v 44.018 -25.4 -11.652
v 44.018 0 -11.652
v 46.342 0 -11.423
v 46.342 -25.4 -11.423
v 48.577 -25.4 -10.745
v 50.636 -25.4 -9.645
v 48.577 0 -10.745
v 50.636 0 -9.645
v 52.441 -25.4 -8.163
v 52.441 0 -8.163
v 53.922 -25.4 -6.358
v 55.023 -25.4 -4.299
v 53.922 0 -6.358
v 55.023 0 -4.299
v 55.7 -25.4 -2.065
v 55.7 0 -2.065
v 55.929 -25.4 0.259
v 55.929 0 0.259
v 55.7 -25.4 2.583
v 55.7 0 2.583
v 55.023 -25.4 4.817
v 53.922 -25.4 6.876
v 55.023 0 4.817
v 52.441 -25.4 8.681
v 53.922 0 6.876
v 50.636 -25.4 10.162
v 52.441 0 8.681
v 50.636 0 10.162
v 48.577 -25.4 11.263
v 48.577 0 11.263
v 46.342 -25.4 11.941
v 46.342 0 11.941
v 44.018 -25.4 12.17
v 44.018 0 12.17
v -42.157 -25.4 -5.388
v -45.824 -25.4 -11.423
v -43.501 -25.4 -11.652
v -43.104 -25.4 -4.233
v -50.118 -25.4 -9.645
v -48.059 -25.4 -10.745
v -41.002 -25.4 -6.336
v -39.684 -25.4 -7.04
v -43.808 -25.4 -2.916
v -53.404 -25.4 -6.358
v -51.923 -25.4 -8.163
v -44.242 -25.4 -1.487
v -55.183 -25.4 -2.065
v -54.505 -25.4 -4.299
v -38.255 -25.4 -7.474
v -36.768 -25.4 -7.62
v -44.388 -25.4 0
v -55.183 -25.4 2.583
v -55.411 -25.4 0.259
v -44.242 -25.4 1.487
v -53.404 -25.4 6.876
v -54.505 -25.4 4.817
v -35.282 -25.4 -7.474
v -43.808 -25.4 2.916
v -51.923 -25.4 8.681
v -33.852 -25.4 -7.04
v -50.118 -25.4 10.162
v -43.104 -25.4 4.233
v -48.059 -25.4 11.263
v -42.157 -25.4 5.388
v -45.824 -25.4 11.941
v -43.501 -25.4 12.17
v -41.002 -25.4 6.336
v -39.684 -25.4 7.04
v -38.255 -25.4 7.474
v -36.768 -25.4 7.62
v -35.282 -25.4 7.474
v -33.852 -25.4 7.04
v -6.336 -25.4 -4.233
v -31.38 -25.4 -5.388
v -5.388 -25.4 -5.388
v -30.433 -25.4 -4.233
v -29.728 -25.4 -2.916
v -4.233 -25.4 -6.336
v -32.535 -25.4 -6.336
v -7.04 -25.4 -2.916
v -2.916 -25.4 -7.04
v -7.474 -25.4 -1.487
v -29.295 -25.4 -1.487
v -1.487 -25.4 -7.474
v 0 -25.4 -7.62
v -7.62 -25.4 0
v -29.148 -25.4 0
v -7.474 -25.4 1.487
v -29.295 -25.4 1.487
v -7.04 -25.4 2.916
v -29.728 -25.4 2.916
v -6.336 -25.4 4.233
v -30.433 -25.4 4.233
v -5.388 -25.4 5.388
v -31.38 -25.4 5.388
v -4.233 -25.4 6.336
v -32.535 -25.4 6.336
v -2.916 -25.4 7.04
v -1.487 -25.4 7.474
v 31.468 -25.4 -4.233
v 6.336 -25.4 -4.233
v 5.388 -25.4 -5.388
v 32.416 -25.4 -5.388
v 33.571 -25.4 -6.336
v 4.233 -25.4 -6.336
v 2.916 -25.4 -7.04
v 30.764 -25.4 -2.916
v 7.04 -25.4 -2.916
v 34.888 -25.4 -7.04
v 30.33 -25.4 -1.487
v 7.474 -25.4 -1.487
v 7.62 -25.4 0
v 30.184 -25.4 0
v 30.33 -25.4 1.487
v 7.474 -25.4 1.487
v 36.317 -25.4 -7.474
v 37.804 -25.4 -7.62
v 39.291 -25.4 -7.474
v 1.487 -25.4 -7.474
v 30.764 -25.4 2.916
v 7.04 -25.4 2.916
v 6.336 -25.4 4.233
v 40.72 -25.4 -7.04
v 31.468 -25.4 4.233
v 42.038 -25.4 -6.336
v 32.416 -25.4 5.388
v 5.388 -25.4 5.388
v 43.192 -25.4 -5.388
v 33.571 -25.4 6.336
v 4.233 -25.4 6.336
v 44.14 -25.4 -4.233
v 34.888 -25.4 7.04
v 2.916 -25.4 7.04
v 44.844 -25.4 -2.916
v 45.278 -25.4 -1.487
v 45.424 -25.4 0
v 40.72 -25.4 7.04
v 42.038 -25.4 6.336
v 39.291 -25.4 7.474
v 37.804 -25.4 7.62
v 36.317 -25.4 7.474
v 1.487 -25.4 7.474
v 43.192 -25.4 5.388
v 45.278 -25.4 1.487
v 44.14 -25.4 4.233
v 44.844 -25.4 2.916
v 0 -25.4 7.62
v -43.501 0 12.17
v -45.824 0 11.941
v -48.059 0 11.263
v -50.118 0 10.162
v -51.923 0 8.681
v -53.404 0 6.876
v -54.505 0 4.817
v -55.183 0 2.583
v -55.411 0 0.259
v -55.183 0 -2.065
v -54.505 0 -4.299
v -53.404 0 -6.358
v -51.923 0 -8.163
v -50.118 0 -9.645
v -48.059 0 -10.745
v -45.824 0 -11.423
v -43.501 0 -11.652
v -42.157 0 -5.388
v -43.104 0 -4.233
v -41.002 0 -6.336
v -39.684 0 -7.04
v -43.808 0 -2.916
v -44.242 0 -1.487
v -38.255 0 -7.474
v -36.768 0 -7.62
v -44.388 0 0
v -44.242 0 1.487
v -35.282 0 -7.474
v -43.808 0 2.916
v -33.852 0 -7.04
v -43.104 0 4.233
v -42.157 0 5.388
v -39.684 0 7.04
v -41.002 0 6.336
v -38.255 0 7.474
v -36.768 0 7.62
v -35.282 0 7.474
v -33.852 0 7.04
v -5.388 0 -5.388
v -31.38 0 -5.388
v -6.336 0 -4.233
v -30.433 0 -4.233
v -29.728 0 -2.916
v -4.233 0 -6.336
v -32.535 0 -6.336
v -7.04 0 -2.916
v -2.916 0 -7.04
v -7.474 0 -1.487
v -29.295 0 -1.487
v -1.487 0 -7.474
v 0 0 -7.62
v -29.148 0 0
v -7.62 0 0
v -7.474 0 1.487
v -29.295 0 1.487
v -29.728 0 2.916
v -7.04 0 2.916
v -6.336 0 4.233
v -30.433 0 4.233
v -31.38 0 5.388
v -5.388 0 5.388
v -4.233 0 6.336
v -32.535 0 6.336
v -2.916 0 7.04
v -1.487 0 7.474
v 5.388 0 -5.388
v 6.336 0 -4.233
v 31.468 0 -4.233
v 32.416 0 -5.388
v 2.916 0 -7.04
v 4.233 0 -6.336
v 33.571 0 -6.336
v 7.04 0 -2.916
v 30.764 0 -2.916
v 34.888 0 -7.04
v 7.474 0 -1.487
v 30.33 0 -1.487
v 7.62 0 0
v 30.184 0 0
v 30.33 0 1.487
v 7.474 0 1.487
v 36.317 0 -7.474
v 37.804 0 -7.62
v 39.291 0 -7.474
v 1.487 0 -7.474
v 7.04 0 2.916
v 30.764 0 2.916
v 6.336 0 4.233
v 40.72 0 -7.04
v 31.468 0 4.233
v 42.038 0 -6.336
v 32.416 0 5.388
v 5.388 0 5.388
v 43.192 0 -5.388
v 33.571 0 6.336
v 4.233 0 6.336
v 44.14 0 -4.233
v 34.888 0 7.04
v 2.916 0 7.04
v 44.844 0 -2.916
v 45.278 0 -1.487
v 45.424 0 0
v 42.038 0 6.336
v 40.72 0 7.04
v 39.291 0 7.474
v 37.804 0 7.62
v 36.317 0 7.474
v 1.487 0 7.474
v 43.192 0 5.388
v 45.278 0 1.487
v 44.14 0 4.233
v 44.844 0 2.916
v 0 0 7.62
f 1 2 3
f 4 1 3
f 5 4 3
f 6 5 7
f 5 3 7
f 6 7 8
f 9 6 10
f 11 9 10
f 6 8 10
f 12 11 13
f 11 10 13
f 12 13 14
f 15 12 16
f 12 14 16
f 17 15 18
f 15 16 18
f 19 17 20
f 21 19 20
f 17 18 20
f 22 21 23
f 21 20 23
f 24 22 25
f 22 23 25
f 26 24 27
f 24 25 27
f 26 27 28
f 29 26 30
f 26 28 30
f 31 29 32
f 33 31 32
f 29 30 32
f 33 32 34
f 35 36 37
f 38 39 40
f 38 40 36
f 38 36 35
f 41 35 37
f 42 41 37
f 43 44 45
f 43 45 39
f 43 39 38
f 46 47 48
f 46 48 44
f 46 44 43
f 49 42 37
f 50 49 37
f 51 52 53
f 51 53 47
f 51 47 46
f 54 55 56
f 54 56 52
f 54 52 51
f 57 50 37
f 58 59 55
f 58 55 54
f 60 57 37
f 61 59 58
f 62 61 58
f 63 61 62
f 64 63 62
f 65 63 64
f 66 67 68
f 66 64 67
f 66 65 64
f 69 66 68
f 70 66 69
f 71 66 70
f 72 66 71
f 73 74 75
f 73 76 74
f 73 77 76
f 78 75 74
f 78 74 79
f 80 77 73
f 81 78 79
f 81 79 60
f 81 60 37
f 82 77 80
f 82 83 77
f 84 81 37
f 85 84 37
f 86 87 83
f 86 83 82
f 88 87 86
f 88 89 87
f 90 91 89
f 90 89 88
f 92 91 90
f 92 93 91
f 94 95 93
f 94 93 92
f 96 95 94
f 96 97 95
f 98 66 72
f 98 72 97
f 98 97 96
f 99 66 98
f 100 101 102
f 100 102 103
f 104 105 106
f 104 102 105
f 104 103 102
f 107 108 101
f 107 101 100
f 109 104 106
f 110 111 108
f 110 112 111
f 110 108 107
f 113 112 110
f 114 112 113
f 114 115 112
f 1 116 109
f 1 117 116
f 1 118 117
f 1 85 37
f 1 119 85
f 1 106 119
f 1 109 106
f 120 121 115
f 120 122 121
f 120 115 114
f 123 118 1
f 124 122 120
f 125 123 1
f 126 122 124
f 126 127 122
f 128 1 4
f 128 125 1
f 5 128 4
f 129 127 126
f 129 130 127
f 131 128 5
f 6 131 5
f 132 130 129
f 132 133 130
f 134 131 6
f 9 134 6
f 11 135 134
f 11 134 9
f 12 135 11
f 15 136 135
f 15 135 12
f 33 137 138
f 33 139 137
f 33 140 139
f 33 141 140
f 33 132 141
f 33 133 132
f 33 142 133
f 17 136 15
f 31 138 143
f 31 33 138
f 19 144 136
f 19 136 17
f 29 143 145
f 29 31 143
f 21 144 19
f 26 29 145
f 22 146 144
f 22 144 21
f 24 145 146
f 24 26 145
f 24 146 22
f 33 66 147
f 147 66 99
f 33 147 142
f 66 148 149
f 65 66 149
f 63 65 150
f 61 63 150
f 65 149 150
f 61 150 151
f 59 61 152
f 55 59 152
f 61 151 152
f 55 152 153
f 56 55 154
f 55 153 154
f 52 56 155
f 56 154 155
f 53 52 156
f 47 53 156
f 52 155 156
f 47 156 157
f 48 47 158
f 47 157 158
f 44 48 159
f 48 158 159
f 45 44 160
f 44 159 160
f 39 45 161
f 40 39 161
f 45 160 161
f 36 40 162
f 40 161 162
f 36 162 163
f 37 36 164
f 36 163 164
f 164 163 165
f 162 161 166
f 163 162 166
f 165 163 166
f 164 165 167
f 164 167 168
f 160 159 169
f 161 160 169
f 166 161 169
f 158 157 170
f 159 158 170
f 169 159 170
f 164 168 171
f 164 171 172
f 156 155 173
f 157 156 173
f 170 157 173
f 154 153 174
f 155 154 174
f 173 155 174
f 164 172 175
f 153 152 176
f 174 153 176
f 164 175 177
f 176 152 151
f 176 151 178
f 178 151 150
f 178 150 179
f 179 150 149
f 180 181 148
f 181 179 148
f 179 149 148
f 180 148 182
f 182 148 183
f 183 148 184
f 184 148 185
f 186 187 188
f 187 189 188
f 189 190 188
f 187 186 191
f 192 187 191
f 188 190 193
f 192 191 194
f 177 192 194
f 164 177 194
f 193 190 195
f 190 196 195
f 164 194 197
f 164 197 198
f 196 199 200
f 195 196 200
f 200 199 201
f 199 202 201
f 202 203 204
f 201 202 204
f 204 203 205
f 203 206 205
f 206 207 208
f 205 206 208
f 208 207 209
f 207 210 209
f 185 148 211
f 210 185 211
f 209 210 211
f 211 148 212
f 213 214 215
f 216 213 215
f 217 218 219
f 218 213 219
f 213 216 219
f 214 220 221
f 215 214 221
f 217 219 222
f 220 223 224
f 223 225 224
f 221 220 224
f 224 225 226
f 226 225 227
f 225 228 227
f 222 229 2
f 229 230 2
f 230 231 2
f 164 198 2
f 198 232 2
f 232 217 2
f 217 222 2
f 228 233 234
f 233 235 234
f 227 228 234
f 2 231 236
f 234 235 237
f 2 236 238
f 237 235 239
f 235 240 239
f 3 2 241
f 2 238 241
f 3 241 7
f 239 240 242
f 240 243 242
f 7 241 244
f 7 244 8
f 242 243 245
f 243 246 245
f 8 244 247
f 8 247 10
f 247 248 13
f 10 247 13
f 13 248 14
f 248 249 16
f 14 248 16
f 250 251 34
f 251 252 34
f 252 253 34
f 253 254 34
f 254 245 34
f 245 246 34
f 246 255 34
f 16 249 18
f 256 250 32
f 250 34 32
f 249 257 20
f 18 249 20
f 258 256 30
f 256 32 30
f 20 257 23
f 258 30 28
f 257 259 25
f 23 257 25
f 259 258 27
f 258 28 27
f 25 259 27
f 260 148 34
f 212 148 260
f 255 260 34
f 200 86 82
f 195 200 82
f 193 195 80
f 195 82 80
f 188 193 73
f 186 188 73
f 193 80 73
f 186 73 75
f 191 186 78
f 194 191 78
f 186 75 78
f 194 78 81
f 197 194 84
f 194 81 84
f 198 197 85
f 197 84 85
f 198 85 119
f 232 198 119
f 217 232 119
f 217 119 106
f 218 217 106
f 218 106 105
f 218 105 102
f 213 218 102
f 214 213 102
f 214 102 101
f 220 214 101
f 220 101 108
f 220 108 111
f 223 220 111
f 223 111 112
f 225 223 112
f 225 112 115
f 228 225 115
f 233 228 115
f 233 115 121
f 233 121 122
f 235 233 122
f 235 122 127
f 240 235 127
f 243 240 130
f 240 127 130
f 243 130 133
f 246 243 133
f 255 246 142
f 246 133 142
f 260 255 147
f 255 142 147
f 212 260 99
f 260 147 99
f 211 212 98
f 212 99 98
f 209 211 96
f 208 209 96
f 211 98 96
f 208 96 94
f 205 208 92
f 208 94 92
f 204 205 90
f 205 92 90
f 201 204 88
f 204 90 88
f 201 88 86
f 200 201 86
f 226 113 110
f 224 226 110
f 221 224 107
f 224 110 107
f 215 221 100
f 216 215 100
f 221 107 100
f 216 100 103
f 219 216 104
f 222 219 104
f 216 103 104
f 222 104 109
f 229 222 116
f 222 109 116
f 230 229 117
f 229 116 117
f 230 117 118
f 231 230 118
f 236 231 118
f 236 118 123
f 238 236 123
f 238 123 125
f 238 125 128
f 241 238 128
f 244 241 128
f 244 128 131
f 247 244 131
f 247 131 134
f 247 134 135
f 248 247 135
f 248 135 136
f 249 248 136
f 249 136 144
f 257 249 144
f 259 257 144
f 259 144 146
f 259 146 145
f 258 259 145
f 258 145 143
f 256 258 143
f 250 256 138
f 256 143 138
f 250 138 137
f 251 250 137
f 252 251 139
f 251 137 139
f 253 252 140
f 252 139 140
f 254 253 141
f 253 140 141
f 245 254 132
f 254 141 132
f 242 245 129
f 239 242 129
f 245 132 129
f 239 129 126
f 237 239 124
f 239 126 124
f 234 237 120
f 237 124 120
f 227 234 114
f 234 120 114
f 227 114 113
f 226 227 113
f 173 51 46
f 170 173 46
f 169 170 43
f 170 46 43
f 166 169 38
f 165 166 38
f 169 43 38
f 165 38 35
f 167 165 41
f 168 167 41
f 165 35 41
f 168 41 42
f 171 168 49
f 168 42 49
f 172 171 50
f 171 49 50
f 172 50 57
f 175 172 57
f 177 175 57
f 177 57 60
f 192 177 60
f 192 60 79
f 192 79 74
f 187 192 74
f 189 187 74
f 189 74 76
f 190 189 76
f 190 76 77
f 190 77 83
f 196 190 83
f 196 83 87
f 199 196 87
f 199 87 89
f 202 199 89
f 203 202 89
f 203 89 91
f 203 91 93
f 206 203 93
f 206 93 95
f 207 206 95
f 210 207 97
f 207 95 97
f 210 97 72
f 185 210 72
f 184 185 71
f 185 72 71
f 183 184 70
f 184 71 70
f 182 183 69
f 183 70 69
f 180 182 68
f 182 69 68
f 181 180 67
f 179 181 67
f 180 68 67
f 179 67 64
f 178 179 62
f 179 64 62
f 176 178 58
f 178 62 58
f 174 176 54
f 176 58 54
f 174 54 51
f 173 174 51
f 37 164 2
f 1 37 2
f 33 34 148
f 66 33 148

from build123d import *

# Parameters (mm, degrees)
F0_R     = 9.44458633
F1_DEPTH = 25.4
F2_D     = 15.24
F3_D     = 15.24
F4_D     = 15.24


with BuildPart() as f1:
    # F0 (on Front) → F1 (new body)
    with BuildSketch(Plane.XZ):
        with BuildLine():
            Line((44.0184436738, 12.1698062867), (-43.5005836189, 12.1698062867))
            ThreePointArc((-43.5005836189, 12.1698062867), (-55.4114580154, 0.2589318901), (-43.5005836189, -11.6519425064))
            Line((-43.5005836189, -11.6519425064), (44.0184436738, -11.6519425064))
            ThreePointArc((44.0184436738, -11.6519425064), (55.9293180704, 0.2589318901), (44.0184436738, 12.1698062867))
        make_face()
        with Locations((-36.7683507502, 0)):
            Circle(F0_R, mode=Mode.SUBTRACT)
        Circle(F0_R, mode=Mode.SUBTRACT)
        with Locations((37.8040745854, 0)):
            Circle(F0_R, mode=Mode.SUBTRACT)
        with Locations((-36.7683507502, 0)):
            Circle(F0_R)
        Circle(F0_R)
        with Locations((37.8040745854, 0)):
            Circle(F0_R)
    extrude(amount=F1_DEPTH)

    # F2 (through all)
    with Locations(Plane(origin=(0, 0, 0), x_dir=(1, 0, 0), z_dir=(0, 1, 0))):
        with Locations((-36.7683507502, 0)):
            Hole(F2_D / 2)

    # F3 (through all)
    with Locations(Plane(origin=(0, 0, 0), x_dir=(1, 0, 0), z_dir=(0, 1, 0))):
        with Locations((0, 0)):
            Hole(F3_D / 2)

    # F4 (through all)
    with Locations(Plane(origin=(0, 0, 0), x_dir=(1, 0, 0), z_dir=(0, 1, 0))):
        with Locations((37.8040745854, 0)):
            Hole(F4_D / 2)


solid = f1.part
